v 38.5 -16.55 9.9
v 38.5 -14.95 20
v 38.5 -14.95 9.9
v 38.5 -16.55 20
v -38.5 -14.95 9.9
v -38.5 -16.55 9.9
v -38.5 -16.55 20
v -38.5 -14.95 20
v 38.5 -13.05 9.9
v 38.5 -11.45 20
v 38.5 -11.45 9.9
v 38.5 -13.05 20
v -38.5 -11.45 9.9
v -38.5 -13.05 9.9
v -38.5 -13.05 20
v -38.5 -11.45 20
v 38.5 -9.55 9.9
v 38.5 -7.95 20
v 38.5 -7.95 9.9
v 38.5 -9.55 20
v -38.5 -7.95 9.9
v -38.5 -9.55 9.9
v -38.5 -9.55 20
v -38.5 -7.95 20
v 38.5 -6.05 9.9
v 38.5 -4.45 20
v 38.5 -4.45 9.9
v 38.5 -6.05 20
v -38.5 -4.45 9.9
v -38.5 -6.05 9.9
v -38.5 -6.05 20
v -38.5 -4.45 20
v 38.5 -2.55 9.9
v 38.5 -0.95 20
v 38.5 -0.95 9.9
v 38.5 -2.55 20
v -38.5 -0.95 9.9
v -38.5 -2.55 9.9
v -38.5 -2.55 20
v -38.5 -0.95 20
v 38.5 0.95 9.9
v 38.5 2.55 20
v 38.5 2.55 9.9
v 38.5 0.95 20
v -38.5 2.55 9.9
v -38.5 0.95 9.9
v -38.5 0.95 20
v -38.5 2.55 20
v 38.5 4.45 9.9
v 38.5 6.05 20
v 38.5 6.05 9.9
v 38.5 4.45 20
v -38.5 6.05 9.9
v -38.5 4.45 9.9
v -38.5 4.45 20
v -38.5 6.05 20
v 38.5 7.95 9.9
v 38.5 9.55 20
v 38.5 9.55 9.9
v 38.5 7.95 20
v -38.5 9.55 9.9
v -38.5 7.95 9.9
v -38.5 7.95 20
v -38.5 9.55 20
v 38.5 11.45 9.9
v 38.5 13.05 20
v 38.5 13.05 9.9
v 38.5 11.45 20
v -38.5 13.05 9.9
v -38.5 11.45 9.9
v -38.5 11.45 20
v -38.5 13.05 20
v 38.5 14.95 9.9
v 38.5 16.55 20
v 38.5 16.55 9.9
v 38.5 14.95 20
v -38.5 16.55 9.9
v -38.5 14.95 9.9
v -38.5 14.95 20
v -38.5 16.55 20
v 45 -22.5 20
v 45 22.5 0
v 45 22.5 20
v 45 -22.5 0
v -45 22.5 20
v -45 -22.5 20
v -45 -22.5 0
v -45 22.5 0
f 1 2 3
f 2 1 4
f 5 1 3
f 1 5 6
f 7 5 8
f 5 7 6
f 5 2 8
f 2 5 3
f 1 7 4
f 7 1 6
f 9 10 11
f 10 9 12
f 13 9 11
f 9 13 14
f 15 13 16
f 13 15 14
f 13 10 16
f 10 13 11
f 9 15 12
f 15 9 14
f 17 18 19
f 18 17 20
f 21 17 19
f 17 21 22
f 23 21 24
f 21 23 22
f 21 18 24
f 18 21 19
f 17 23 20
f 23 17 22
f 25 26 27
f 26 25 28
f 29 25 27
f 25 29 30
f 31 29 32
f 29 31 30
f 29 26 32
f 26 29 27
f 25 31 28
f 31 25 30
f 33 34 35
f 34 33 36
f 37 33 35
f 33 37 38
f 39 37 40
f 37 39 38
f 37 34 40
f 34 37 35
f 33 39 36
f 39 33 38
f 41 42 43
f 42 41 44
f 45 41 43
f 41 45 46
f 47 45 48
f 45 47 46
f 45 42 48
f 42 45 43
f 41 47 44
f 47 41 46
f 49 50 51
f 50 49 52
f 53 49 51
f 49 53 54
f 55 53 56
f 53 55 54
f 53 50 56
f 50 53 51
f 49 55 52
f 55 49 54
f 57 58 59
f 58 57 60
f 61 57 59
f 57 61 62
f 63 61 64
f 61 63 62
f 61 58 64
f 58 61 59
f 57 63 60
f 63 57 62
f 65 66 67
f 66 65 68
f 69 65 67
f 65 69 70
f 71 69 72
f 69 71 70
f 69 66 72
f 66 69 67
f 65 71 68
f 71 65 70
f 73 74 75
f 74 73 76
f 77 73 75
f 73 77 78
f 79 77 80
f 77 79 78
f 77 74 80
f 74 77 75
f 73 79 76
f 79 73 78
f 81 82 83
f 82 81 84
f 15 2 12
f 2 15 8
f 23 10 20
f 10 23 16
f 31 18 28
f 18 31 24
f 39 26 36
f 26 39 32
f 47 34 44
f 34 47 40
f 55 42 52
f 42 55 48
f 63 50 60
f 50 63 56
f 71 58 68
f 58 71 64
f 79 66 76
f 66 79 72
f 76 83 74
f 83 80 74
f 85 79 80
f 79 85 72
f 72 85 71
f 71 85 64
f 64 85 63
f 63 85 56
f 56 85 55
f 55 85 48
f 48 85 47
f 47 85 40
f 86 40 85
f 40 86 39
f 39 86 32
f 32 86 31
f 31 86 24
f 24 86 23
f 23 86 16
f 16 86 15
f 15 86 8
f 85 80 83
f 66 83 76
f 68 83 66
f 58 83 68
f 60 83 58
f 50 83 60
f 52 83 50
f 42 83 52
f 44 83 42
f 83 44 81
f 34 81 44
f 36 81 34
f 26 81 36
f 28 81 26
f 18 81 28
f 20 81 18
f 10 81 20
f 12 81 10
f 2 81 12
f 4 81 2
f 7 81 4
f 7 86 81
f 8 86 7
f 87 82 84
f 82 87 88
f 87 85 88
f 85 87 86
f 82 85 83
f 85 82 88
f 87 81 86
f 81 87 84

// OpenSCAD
// ---------- Parameters ----------
base_x = 90;          // block length (X) in mm
base_y = 45;          // block width  (Y) in mm
base_z = 20;          // block height (Z) in mm

slot_length = 77;    // slot length along X in mm
slot_width  = 1.6;   // slot width  along Y in mm
slot_depth  = 10;    // slot depth down from top surface in mm

slot_spacing = 3.5;  // centre‑to‑centre spacing of slots in Y (mm)
num_slots = 10;      // number of slots

extra_cut = 0.2;     // extra material beyond cut faces (mm)

// ---------- Geometry ----------
$fn = 64;   // smoothness for curved shapes (not needed here, but set for completeness)

module base_block() {
    // Block centered on origin, bottom at Z = 0
    translate([-base_x/2, -base_y/2, 0])
        cube([base_x, base_y, base_z]);
}

module slot(y_center) {
    // Cutting shape for a slot: extends slightly below the intended depth
    // and slightly above the top surface to avoid coplanar faces.
    cut_height = slot_depth + extra_cut;          // total height of cutting shape
    bottom_z = base_z - slot_depth - extra_cut/2; // bottom of cut shape (below top)
    translate([
        -slot_length/2,               // X: centered on block
        y_center - slot_width/2,      // Y: shift to slot centre
        bottom_z                       // Z: bottom of cut shape
    ])
        cube([slot_length, slot_width, cut_height]);
}

// ---------- Assembly ----------
difference() {
    base_block();

    // Subtract the 10 slots from the top face
    for (i = [0:num_slots-1]) {
        // Compute centre Y position of each slot (centered on block)
        y_center = (i - (num_slots-1)/2) * slot_spacing;
        slot(y_center);
    }
}
